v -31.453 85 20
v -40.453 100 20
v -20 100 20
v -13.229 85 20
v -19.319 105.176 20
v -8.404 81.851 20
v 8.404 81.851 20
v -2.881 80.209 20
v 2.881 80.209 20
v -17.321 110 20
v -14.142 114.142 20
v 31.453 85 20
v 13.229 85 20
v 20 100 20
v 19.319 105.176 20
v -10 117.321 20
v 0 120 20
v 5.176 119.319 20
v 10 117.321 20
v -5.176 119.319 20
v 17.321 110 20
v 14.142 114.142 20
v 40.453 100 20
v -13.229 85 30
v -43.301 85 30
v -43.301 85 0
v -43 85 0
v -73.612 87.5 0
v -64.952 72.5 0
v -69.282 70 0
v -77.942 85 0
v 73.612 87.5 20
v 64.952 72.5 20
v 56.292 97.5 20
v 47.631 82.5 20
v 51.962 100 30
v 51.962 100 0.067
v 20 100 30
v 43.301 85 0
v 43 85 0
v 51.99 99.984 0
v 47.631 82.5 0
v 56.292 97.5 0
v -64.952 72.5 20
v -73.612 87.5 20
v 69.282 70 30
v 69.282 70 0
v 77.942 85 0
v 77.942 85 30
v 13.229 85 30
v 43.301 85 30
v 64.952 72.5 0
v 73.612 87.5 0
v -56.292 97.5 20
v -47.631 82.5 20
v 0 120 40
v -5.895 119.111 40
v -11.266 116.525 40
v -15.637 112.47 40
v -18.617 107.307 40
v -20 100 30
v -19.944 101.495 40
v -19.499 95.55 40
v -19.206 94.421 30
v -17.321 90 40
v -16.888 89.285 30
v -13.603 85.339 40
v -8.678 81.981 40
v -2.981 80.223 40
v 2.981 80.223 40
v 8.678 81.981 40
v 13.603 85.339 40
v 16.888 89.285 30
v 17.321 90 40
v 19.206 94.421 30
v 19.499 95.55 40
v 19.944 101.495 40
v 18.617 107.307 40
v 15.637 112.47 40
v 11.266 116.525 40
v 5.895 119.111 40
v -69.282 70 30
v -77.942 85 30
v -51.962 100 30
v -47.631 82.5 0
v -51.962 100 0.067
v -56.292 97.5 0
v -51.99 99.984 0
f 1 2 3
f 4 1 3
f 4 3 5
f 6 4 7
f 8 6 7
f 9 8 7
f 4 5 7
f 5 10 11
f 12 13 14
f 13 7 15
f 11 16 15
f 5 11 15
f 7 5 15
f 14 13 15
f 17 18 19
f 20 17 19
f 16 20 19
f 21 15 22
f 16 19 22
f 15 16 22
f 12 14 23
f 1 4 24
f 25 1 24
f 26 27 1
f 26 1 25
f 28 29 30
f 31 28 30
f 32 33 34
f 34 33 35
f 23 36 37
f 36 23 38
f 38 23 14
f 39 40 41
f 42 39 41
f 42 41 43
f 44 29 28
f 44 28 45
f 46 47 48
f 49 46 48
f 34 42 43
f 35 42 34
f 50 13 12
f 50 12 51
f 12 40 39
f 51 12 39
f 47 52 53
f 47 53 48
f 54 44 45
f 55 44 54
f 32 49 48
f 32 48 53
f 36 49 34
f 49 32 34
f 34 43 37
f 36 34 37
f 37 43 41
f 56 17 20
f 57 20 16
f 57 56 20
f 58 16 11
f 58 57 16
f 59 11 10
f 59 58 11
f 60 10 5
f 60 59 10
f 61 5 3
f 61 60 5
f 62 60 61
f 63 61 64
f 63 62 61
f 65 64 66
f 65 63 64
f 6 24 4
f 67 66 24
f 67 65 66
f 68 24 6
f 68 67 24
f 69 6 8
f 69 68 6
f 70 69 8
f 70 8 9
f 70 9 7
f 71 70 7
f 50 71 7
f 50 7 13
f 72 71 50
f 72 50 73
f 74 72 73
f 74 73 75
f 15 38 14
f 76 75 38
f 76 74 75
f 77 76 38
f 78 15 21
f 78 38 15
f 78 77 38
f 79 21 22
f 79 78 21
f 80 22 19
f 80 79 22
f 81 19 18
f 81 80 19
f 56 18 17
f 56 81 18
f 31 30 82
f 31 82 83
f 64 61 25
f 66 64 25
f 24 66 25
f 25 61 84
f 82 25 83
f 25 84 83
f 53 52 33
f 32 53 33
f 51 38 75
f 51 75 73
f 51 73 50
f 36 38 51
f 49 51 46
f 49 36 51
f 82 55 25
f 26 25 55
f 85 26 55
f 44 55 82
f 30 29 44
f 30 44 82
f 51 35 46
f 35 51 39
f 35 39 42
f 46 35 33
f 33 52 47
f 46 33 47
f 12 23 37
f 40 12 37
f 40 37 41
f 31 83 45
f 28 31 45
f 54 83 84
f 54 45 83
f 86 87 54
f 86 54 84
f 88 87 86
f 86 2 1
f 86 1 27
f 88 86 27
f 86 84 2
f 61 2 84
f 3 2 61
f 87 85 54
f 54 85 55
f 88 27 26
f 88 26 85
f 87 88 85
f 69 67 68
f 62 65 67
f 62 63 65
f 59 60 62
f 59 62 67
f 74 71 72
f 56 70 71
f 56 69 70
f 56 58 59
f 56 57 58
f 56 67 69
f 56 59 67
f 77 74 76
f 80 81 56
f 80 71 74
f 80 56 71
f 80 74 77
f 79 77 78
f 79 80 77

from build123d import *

# Parameters (mm, degrees)
PAD001_DEPTH = 10
PAD_DEPTH    = 30
SKETCH001_W  = 20
SKETCH001_H  = 20
POCKET_DEPTH = 50


with BuildPart() as loft_body:
    # Sketch002 → Loft section 0
    with BuildSketch(Plane.XZ.offset(-85)):
        Polygon((1, 20), (-31.452995, 20), (-43, 0), (1, 0), align=None)
    # Sketch003 → Loft section 1
    with BuildSketch(Plane(origin=(0, 100, 0), x_dir=(-1, 0, 0), z_dir=(0, 1, 0))):
        Polygon((0, 20), (40.452995, 20), (52, 0), (0, 0), align=None)
    loft()


with BuildPart() as pad001:
    # Sketch005 → Pad001 (new body, symmetric)
    with BuildSketch(Plane.XY.offset(30)):
        with BuildLine():
            ThreePointArc((0, 120), (-20, 100), (0, 80))
            Line((0, 120), (0, 80))
        make_face()
    extrude(amount=PAD001_DEPTH, both=True)


with BuildPart() as cut:
    # Sketch → Pad (new body)
    with BuildSketch(Plane.XY):
        Polygon((-51.961524, 100), (0, 100), (0.112312, 85), (-43.30127, 85), (-69.282032, 70), (-77.942286, 85), align=None)
    extrude(amount=PAD_DEPTH)

    # Sketch001 → Pocket (cut)
    with BuildSketch(Plane(origin=(-47.631397, 82.5, 0), x_dir=(0.866025, 0.5, 0), z_dir=(0.5, -0.866025, 0))):
        with Locations((-10, 10)):
            Rectangle(SKETCH001_W, SKETCH001_H)
    extrude(amount=-POCKET_DEPTH, mode=Mode.SUBTRACT)

    # Fusion: union Pad001
    add(pad001.part)

    # Cut: cut Loft body
    add(loft_body.part, mode=Mode.SUBTRACT)


with BuildPart() as fusion001:
    # Part__Mirroring: instance of Cut
    add(cut.part.mirror(Plane(origin=(0, 0, 0), x_dir=(0, -1, 0), z_dir=(1, 0, 0))))

    # Fusion001: union Cut
    add(cut.part)


solid = fusion001.part
